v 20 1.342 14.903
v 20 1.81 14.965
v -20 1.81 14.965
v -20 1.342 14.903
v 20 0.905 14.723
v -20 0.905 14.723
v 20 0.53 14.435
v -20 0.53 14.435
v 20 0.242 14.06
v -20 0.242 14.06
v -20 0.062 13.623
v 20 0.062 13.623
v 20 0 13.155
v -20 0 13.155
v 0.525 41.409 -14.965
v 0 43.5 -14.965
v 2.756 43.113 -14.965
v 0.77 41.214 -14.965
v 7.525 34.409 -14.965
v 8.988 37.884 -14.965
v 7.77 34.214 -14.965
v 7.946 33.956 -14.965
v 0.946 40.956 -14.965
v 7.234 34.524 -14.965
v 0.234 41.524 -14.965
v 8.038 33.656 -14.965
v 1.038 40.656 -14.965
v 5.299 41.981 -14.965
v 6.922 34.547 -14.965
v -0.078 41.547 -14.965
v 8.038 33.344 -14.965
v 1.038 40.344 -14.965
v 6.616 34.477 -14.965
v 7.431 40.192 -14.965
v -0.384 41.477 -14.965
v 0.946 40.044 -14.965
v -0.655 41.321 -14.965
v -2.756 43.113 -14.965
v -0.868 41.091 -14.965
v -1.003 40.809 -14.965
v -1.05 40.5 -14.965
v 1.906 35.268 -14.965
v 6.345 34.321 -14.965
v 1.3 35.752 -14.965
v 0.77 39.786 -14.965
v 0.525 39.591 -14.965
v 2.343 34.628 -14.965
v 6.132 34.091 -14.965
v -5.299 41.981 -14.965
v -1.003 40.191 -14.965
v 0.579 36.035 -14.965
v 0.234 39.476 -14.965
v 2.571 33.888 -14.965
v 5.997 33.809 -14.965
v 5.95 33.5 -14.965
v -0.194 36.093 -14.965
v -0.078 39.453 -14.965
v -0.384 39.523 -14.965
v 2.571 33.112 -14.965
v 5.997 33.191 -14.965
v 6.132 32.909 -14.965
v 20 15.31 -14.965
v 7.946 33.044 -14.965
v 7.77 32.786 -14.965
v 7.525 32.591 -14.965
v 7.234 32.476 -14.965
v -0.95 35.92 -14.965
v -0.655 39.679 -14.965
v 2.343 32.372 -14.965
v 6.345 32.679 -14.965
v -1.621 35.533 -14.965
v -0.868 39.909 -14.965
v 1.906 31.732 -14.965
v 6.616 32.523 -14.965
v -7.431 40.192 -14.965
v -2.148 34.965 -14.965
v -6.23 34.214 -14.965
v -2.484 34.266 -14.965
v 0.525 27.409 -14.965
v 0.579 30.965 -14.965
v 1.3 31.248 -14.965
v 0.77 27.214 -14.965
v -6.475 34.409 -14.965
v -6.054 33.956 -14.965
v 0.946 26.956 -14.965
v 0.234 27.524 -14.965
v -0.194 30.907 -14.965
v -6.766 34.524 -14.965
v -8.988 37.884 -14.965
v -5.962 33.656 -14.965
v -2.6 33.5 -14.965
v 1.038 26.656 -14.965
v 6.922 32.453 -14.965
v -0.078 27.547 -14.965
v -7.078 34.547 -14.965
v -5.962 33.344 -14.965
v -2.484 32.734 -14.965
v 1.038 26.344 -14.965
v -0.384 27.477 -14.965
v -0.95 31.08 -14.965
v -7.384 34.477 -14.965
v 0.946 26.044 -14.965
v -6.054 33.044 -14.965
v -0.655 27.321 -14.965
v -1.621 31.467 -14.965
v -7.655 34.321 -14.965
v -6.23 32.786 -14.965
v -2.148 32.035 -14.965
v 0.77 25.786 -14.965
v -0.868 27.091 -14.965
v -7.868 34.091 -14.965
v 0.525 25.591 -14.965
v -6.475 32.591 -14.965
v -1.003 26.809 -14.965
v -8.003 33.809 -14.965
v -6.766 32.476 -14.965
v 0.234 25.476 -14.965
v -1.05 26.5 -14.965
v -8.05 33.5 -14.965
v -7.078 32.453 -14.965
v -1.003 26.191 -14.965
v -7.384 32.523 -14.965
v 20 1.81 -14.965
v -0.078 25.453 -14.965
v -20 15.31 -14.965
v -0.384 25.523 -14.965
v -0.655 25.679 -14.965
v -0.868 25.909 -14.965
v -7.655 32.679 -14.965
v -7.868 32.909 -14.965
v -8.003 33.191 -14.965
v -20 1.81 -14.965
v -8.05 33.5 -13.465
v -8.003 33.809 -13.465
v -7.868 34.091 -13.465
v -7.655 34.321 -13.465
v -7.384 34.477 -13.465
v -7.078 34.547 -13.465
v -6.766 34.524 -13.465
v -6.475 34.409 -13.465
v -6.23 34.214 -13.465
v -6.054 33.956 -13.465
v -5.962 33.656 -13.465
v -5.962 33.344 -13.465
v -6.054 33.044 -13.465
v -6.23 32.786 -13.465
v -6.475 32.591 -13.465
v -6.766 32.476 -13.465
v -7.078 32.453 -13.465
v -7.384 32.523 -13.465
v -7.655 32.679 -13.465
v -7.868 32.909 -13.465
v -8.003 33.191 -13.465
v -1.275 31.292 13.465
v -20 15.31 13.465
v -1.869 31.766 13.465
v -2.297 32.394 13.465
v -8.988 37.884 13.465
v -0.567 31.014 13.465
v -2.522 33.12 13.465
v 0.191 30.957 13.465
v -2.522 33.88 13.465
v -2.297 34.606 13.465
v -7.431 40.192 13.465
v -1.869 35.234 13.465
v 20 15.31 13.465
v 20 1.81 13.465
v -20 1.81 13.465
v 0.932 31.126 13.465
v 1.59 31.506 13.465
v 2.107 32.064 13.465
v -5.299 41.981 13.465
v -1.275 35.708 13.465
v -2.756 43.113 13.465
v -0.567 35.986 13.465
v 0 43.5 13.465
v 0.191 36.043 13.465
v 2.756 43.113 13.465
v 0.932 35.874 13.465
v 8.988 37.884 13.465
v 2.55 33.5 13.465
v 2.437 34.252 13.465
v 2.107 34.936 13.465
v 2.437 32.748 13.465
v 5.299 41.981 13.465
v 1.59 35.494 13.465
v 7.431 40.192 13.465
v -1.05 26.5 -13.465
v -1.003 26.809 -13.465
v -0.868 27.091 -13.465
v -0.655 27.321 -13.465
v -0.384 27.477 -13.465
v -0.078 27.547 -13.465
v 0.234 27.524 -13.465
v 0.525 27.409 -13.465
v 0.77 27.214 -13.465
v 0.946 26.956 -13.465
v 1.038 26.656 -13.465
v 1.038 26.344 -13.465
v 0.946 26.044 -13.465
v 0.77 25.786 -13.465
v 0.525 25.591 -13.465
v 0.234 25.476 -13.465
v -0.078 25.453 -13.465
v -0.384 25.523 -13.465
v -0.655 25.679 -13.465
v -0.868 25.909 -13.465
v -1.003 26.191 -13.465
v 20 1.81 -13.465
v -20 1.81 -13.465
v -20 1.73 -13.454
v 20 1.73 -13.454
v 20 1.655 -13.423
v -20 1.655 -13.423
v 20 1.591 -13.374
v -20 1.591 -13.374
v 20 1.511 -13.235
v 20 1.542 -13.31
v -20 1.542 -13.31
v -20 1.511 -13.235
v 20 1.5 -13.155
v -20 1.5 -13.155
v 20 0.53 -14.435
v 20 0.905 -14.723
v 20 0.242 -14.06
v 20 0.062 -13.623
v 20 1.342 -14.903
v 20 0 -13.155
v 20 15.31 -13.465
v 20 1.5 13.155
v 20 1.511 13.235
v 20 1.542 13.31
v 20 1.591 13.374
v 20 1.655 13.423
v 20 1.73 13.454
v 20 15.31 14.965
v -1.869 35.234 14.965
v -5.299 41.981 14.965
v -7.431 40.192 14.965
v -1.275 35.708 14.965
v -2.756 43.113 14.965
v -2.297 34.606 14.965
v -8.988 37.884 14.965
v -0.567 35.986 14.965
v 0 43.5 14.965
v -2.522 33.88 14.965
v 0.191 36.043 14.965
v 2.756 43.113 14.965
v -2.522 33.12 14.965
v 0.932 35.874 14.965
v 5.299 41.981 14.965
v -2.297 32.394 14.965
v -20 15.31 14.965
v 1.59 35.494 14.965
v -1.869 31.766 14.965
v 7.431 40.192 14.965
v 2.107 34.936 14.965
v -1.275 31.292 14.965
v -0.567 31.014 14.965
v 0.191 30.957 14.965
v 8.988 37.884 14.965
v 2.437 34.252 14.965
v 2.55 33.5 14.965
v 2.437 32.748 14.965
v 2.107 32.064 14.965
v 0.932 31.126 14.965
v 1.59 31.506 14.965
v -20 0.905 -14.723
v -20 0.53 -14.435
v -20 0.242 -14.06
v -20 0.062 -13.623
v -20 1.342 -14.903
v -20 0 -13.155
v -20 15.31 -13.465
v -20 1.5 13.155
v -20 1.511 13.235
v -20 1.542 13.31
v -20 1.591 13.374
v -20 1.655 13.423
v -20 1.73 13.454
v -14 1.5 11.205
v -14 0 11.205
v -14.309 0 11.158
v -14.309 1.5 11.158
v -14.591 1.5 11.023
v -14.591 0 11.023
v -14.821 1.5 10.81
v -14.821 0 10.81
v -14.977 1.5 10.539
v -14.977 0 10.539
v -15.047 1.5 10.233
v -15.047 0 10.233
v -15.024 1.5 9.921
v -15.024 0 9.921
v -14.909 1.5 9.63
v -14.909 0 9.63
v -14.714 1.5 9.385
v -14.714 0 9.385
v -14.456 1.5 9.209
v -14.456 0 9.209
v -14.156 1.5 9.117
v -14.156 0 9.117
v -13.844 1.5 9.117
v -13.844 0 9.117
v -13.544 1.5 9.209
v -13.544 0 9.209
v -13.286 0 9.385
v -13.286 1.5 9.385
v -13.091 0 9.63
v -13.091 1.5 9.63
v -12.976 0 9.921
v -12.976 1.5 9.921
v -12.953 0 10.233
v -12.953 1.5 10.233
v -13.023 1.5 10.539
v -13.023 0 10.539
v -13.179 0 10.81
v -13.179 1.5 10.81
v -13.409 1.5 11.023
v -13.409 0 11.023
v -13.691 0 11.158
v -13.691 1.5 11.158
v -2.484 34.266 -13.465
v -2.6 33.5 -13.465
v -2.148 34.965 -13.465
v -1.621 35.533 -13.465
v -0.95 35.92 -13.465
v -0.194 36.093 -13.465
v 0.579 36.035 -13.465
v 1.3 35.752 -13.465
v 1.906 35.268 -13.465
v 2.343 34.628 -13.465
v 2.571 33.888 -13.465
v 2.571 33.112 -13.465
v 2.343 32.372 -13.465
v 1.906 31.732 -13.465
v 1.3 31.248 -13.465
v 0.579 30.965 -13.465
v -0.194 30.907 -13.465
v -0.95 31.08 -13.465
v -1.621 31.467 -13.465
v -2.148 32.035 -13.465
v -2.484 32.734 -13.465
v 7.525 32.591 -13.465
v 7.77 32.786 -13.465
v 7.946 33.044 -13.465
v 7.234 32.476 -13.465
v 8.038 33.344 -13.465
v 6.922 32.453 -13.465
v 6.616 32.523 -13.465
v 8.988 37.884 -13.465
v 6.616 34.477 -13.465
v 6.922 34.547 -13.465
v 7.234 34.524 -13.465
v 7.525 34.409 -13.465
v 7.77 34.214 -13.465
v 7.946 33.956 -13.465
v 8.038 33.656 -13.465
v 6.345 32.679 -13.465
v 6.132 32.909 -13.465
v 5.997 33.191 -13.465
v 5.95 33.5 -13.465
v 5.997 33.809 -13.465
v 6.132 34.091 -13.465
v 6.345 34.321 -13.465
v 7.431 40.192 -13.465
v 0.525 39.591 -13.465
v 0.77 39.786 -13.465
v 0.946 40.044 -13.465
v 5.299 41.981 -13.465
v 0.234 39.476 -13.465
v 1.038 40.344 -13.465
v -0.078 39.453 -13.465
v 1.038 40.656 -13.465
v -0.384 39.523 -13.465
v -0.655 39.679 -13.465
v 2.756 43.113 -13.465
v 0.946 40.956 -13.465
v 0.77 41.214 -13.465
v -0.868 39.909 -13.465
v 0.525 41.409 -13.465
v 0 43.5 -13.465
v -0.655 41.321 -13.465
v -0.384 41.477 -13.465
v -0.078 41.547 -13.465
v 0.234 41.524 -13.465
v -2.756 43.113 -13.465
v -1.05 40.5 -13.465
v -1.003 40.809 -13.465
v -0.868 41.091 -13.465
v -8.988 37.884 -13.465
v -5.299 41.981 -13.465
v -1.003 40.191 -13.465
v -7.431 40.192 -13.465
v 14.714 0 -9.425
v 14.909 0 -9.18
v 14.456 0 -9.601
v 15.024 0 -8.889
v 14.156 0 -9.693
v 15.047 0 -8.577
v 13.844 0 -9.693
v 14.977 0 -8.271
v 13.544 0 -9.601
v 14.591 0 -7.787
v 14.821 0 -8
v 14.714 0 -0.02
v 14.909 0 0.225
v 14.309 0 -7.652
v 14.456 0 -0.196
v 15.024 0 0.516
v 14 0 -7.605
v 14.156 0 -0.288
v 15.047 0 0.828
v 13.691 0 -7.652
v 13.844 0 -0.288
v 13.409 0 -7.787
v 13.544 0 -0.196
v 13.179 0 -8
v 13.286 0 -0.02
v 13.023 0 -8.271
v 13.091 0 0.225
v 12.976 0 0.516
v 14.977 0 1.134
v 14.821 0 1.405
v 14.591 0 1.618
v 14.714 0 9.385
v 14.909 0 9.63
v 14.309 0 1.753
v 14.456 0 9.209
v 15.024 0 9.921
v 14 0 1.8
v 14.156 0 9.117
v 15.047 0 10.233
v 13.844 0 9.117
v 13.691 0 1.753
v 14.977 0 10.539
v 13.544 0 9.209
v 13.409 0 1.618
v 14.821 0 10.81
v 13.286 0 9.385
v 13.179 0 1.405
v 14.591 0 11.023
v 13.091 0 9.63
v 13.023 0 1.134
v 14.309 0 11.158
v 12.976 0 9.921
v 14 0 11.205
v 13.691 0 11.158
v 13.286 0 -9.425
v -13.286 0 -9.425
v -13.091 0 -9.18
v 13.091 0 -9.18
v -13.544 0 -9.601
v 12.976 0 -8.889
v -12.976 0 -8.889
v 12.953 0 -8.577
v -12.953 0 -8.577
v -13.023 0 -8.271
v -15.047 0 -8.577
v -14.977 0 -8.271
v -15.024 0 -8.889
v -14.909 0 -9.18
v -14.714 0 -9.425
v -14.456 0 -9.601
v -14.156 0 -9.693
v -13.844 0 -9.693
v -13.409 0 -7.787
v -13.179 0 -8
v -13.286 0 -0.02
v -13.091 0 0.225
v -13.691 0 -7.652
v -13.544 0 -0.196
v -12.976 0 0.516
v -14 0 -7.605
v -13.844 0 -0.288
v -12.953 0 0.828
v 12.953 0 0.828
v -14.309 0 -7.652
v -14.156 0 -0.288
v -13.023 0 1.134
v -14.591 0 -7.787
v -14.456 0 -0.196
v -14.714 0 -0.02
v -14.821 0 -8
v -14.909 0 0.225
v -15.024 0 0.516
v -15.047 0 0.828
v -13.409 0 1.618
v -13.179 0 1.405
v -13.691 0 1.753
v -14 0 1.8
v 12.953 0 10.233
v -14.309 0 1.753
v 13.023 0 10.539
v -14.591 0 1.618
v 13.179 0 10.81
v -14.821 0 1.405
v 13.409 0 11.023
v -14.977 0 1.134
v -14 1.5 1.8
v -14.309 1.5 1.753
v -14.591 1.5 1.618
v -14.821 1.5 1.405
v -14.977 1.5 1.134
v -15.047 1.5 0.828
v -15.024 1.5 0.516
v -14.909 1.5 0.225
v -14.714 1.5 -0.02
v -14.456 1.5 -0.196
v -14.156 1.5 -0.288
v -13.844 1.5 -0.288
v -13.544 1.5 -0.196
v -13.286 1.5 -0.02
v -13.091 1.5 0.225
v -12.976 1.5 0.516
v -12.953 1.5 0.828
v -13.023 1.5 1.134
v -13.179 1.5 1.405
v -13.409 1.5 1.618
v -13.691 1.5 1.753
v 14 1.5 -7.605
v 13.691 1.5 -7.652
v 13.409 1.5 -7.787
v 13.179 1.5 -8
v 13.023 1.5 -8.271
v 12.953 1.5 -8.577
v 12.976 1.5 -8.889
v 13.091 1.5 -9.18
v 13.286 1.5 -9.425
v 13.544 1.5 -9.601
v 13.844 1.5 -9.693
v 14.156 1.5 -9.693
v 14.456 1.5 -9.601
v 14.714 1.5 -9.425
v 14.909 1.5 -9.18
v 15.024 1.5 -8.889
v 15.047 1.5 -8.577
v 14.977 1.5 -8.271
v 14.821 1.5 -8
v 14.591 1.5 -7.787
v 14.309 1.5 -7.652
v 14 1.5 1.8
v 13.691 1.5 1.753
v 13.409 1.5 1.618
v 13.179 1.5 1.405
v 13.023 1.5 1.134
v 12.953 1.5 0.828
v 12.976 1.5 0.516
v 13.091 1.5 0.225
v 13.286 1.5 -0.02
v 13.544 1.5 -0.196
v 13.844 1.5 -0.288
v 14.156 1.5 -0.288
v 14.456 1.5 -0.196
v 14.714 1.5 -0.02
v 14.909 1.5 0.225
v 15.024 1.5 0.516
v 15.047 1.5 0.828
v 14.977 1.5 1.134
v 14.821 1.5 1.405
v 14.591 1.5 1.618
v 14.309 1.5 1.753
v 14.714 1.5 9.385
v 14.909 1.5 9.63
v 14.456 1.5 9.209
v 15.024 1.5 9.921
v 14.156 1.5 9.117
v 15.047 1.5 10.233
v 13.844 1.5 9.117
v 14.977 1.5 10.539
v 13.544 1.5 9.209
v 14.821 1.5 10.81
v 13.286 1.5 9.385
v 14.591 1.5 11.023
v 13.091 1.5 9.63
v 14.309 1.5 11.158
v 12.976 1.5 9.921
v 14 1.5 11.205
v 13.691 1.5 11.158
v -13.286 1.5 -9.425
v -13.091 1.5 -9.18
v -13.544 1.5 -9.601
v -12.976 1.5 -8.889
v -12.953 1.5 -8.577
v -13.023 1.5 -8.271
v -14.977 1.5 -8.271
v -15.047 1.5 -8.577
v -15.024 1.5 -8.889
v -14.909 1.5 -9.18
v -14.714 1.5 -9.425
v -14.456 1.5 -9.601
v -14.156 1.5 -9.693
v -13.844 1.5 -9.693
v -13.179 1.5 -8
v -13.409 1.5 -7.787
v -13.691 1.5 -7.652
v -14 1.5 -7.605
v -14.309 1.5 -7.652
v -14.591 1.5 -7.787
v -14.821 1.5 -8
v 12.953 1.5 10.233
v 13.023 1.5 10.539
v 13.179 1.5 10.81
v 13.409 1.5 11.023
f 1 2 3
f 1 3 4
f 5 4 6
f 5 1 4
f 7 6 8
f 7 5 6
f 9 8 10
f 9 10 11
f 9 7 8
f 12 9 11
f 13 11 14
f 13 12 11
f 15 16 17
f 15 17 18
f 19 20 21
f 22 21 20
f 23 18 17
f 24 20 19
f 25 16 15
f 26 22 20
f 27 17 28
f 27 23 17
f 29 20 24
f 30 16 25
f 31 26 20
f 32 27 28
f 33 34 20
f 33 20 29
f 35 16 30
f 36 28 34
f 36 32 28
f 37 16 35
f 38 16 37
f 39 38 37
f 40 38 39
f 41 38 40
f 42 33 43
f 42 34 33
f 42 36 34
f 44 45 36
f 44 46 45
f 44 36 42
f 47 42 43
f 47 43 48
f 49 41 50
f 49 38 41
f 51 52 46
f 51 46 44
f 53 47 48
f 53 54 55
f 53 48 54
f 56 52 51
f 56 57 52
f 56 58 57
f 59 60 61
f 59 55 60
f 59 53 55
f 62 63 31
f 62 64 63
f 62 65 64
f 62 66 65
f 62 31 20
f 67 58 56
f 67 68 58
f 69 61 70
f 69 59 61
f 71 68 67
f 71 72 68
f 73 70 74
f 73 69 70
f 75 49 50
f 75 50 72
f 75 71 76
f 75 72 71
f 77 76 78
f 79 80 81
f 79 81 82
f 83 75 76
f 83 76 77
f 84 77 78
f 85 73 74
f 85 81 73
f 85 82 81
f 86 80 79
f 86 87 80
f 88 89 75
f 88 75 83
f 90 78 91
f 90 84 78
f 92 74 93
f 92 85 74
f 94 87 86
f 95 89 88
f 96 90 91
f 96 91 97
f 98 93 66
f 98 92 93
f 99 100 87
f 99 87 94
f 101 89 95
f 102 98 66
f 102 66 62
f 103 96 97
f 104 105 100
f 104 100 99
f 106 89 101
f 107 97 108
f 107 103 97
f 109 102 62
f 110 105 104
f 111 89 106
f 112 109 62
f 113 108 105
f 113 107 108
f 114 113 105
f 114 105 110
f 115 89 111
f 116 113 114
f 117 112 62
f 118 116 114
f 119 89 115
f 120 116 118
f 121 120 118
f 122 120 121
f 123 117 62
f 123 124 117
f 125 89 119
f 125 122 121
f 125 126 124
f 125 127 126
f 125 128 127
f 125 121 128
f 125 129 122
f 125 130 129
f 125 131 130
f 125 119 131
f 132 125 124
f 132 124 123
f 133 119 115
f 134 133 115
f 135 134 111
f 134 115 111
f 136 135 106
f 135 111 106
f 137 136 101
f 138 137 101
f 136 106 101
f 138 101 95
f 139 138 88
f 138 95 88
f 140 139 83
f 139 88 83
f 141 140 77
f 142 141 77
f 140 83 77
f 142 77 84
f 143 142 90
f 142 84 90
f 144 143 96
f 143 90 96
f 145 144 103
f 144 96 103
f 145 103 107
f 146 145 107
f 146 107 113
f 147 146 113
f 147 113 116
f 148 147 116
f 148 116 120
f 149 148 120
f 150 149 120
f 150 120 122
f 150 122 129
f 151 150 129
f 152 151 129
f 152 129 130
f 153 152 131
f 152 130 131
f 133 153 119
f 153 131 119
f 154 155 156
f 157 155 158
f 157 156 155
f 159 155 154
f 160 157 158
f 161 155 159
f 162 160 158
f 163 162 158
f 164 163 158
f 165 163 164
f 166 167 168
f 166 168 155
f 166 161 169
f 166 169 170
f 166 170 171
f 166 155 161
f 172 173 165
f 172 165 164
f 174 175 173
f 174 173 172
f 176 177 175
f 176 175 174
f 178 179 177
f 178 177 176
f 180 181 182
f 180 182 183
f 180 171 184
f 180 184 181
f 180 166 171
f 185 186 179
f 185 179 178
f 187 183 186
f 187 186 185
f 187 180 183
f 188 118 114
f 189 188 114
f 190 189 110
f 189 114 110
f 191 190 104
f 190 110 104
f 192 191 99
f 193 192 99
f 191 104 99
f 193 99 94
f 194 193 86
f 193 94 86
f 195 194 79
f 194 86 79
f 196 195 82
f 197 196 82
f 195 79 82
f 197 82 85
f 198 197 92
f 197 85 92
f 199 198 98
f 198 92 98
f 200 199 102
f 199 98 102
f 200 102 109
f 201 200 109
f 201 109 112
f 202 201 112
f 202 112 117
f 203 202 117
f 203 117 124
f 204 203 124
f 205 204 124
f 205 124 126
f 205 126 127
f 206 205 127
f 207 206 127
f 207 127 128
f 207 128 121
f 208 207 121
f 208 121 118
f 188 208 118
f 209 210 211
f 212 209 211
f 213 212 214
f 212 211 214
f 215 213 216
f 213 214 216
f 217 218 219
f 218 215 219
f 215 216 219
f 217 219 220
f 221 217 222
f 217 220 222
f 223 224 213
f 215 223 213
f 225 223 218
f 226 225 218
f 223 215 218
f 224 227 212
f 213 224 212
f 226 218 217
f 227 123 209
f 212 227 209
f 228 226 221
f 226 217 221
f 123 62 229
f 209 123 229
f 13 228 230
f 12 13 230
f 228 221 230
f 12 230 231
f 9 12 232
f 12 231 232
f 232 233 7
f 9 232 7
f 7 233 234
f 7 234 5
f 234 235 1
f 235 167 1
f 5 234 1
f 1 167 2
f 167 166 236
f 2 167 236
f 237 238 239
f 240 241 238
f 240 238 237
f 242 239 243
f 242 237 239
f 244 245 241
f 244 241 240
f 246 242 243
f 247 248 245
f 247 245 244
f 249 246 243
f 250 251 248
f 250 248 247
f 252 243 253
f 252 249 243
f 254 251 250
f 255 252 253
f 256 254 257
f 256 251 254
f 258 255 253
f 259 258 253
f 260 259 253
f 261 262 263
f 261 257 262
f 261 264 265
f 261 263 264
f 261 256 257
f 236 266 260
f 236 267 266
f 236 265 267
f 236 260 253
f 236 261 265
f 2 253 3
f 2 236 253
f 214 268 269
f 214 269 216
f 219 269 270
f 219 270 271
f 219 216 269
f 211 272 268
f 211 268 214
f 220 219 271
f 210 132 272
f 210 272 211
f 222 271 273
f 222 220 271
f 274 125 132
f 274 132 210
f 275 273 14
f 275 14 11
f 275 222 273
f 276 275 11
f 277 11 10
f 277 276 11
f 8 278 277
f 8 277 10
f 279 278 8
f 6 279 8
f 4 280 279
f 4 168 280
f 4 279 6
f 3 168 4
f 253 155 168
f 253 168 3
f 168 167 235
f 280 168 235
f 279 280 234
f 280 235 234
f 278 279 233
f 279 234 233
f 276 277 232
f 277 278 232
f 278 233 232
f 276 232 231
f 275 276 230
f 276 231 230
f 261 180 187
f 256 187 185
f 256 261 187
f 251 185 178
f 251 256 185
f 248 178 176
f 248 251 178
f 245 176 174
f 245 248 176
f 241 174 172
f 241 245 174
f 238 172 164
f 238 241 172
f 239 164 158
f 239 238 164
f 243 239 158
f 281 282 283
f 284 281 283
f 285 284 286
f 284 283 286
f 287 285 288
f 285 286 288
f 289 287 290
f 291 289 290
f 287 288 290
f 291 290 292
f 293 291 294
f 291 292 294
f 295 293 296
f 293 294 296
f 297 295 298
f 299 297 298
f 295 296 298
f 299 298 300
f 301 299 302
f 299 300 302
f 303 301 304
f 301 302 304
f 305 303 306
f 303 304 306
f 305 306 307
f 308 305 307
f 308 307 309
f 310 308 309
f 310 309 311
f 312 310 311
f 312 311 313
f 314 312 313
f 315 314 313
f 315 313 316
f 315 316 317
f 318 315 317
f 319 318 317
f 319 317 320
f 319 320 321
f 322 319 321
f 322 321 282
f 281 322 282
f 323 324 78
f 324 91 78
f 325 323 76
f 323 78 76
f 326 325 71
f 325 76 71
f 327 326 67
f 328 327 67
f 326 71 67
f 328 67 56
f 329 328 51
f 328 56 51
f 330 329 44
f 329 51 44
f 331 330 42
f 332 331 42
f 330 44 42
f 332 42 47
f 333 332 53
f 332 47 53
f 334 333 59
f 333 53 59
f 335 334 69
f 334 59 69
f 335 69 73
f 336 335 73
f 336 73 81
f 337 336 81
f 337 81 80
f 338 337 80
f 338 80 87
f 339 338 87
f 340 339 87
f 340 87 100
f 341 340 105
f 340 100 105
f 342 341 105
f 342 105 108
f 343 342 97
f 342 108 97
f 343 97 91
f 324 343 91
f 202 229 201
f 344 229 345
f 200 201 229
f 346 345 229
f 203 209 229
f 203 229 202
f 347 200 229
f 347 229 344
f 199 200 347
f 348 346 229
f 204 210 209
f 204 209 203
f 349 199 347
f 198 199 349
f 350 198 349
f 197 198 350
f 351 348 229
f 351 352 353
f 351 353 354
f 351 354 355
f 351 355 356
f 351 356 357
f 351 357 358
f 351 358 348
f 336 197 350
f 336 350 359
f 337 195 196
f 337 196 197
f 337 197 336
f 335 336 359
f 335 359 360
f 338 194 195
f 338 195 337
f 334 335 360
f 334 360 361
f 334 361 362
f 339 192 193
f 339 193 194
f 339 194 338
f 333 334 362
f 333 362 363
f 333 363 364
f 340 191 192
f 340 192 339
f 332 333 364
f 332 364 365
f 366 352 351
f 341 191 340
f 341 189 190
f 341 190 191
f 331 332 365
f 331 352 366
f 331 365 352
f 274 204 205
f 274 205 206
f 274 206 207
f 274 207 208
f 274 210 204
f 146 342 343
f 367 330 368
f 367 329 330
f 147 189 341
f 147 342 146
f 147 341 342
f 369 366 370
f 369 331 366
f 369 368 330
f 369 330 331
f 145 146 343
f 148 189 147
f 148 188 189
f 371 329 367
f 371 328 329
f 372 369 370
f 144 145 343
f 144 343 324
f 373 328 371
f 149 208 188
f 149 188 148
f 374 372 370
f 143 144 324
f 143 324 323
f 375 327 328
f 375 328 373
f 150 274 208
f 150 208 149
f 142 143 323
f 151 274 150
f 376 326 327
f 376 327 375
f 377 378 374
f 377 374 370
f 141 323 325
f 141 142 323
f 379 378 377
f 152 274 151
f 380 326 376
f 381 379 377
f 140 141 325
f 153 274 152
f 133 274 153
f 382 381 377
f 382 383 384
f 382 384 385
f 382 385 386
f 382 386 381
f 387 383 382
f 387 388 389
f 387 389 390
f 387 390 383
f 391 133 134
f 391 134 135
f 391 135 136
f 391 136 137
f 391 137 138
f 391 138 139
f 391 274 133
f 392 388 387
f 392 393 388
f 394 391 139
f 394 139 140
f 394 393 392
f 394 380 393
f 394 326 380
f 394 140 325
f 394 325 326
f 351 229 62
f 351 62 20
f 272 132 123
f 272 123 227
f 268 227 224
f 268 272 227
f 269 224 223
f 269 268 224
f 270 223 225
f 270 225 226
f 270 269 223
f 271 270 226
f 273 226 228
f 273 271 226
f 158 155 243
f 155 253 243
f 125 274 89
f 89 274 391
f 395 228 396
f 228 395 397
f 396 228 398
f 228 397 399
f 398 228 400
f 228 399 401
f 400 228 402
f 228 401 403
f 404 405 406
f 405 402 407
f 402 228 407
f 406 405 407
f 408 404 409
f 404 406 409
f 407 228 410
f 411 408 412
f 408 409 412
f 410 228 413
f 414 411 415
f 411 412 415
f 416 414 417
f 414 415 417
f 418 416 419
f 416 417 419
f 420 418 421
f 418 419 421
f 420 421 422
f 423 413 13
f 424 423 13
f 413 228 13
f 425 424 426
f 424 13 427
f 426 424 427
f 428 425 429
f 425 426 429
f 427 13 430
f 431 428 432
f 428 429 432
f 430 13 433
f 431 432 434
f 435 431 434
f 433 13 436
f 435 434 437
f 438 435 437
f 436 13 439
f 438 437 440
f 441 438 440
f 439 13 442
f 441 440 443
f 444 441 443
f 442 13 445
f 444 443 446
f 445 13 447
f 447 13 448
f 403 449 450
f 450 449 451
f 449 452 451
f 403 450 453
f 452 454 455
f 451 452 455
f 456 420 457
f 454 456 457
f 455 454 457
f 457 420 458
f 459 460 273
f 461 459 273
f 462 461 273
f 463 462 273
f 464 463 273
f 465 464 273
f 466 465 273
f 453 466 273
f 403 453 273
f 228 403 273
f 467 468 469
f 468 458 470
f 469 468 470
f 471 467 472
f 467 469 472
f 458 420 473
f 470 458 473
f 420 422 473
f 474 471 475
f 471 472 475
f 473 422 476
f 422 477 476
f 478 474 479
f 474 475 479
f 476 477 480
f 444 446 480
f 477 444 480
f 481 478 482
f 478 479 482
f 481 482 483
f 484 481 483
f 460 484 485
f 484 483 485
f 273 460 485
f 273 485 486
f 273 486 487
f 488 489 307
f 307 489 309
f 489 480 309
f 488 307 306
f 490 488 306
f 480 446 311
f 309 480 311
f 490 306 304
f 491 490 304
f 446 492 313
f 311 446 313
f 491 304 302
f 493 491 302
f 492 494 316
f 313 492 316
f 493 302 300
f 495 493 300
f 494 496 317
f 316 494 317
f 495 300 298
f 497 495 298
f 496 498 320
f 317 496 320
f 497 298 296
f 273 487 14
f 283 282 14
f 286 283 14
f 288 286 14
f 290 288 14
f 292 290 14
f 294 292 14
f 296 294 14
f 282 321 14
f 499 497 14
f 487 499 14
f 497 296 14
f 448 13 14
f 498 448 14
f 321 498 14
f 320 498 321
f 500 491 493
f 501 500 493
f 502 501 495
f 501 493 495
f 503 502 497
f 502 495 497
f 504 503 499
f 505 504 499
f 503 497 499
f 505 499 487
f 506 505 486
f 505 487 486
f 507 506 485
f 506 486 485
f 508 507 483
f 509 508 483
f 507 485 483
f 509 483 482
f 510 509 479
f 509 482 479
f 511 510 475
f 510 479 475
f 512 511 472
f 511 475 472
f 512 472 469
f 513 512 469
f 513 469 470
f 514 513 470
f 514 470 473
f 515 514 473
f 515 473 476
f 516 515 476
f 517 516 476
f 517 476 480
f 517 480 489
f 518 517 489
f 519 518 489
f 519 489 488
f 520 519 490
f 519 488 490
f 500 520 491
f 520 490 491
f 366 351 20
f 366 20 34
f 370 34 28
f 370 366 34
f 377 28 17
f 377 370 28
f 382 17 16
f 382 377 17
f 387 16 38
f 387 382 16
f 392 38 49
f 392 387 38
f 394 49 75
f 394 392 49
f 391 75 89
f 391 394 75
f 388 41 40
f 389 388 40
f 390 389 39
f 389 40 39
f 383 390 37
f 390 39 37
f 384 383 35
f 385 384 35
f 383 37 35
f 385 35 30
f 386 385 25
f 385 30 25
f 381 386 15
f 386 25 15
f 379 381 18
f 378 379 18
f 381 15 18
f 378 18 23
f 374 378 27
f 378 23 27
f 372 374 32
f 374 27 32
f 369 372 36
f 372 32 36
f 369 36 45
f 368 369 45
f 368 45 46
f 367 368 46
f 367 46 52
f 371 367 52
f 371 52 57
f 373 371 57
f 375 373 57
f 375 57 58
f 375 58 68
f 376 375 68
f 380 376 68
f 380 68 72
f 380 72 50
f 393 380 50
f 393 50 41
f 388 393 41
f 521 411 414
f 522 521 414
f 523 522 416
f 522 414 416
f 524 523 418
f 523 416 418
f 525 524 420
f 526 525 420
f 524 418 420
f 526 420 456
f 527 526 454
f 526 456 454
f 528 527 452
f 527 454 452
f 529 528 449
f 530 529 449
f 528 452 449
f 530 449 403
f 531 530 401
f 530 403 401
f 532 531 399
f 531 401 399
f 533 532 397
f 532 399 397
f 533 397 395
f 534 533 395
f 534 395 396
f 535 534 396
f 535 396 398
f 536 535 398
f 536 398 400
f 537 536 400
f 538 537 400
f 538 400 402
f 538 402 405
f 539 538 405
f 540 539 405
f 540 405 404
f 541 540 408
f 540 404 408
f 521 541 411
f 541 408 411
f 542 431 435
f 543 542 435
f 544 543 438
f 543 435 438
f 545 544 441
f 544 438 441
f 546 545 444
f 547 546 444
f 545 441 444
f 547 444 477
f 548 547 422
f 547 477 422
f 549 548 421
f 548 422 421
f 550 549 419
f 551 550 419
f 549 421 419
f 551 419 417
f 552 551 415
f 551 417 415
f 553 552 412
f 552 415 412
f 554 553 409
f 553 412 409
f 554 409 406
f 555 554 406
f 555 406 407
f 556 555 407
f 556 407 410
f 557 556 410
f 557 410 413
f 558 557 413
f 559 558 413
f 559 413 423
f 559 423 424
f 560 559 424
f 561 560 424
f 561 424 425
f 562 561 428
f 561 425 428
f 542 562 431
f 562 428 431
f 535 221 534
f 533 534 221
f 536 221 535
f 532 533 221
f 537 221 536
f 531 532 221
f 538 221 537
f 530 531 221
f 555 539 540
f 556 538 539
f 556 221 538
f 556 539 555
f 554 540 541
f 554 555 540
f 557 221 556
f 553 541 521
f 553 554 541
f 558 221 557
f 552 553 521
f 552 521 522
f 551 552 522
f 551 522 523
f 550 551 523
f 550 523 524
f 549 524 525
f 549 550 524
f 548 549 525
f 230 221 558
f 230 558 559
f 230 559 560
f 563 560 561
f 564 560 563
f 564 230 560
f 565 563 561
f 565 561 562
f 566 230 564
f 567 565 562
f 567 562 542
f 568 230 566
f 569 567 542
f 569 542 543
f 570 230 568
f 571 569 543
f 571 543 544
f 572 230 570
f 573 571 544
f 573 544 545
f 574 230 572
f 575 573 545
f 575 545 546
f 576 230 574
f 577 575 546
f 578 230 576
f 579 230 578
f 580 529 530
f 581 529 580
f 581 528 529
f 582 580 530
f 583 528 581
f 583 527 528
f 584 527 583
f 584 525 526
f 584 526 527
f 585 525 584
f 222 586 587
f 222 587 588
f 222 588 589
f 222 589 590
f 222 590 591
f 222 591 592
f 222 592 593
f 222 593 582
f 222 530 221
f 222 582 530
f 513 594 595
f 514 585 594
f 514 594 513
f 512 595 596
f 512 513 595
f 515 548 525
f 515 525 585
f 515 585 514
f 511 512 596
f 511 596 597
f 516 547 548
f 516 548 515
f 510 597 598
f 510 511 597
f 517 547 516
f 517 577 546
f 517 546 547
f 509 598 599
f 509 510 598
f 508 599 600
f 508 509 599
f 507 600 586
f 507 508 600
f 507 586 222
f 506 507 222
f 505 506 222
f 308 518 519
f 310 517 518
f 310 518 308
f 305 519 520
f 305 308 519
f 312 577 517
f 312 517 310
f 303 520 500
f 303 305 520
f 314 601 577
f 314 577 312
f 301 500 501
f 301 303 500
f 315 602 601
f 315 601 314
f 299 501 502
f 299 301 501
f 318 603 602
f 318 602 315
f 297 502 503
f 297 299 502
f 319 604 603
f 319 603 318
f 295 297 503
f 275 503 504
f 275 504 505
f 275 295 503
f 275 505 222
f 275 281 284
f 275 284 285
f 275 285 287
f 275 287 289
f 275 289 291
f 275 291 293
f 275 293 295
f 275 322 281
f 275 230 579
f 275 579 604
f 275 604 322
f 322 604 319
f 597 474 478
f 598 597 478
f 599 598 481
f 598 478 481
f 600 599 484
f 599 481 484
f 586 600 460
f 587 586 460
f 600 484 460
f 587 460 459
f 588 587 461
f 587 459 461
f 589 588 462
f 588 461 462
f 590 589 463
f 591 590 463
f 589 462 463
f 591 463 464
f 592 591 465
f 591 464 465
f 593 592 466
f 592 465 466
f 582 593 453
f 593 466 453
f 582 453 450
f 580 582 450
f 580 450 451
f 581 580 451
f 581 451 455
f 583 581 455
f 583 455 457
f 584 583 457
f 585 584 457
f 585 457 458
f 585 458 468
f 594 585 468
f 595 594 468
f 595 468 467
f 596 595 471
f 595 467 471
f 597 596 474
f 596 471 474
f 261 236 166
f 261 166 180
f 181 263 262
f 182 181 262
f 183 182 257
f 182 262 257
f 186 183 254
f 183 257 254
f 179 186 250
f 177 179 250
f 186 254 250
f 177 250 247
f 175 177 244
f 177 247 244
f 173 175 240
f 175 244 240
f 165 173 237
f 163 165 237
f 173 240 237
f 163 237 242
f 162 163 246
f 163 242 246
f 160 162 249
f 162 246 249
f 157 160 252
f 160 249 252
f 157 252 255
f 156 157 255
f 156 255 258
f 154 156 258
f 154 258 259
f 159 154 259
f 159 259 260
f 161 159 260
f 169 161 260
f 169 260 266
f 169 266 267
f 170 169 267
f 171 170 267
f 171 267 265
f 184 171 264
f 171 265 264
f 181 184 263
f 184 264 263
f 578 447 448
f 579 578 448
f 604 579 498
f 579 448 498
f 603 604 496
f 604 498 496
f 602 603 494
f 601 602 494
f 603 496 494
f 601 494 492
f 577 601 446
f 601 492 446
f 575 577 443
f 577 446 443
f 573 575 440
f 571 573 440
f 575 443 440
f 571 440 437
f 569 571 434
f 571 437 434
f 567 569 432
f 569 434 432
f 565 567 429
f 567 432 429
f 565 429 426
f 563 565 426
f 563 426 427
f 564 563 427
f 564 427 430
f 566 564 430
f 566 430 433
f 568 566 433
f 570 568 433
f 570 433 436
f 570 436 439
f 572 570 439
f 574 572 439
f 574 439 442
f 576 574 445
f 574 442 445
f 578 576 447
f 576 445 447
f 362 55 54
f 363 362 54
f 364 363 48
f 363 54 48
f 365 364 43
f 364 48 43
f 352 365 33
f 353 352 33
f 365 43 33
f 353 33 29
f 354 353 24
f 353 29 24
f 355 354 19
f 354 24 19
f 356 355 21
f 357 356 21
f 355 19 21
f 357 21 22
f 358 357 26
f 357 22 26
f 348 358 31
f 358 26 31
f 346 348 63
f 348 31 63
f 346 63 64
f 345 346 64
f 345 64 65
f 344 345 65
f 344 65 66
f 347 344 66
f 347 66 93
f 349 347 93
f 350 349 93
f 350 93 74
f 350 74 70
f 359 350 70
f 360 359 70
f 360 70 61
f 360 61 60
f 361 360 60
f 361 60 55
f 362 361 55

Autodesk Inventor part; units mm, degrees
ref_plane "YZ Plane" through (0, 0, 0) normal (1, 0, 0) x (0, 1, 0)
ref_plane "XZ Plane" through (0, 0, 0) normal (0, 1, 0) x (-1, 0, 0)
ref_plane "XY Plane" through (0, 0, 0) normal (0, 0, 1) x (1, 0, 0)
sketch "Sketch1" plane through (0, 0, 0) normal (0, 1, 0) x (-1, 0, 0)
  line L0 (20, 14.965) -> (-20, 14.965)
  line L1 (-20, 14.965) -> (-20, -14.965)
  line L2 (-20, -14.965) -> (20, -14.965)
  line L3 (20, -14.965) -> (20, 14.965)
  point P0 (0, 0)
  dimension "d0" = 29.93
  dimension "d1" = 40
  dimension "d2" = 20
  dimension "d3" = 14.965
extrude "Plate1" add sketch "Sketch1" along normal blind 1.5
sketch "Sketch2" plane through (-20, 0, -13.465) normal (0, 0, -1) x (-1, 0, 0)
  line L0 (-40, 0) -> (0, 0)
  line L1 (0, 0) -> (0, 43.5)
  line L2 (0, 43.5) -> (-40, 43.5)
  line L3 (-40, 43.5) -> (-40, 0)
edge flange "Flange1" height 43.5 angle 90 thickness 1.5 bend radius 0.31 thickness toward (0, 0, -1) relief tear relief width 1.5 relief depth 0.75 corner gap 0.31 corner form 0 edges at (0, 1.5, -14.965) (0, 1.5, 14.965) wall of the first edge with corners at (20, 0, -13.465) (-20, 0, -13.465) (-20, 43.5, -13.465) (20, 43.5, -13.465)
bend "Bend1"
corner "Corner1"
sketch "Sketch3" plane through (-20, 43.5, 14.965) normal (0, 0, 1) x (1, 0, 0)
  line L0 (0, 0) -> (40, 0) projected
  line L1 (0, -41.69) -> (0, 0) projected
  circle A0 centre (20, -10) radius 10
  line L2 (0, -28.19) -> (40, -28.19)
  line L3 (40, -28.19) -> (40, -38.19)
  line L4 (40, -38.19) -> (0, -38.19)
  line L5 (0, -38.19) -> (0, -28.19)
  line L6 (40, -28.19) -> (28.9876, -5.6156)
  line L7 (0, -28.19) -> (11.0124, -5.6156)
  line L8 (0, 0) -> (40, 0)
  line L9 (40, 0) -> (40, -35)
  line L10 (40, -35) -> (0, -35)
  line L11 (0, -35) -> (0, 0)
  point P0 (20, -43.5)
  point P1 (20, 0)
  point P2 (0, -28.19)
  point P3 (0, -35)
  point P4 (30, -10)
  dimension "d15" = 10
  dimension "d16" = 0
  dimension "d17" = 20
  dimension "d18" = 18.19
  dimension "d19" = 0
  dimension "d20" = 40
  dimension "d21" = 10
  dimension "d22" = 35
extrude "Extrusion1" cut sketch "Sketch3" against normal blind 35 contours L0 A0 L7 L1 | L0 L9 L6 A0
sketch "Sketch4" plane through (20, 1.81, -14.965) normal (0, 0, -1) x (-1, 0, 0)
  arc A0 (28.9876, 36.0744) -> (11.0124, 36.0744) centre (20, 31.69) ccw projected
  circle A1 centre (20, 31.69) radius 2.6
  circle A2 centre (13, 31.69) radius 1.05
  circle A3 centre (27, 31.69) radius 1.05
  circle A4 centre (20, 38.69) radius 1.05
  circle A5 centre (20, 24.69) radius 1.05
  point P0 (20, -1.81)
  dimension "d25" = 5.2
  dimension "d26" = 0
  dimension "d27" = 7
  dimension "d28" = 2.1
  dimension "d29" = 7
  dimension "d30" = 0
  dimension "d31" = 2.1
  dimension "d32" = 0
  dimension "d33" = 7
  dimension "d34" = 2.1
  dimension "d35" = 7
  dimension "d36" = 0
  dimension "d37" = 2.1
extrude "Extrusion2" cut sketch "Sketch4" against normal blind 1.5
sketch "Sketch5" plane through (-20, 1.81, 14.965) normal (0, 0, 1) x (1, 0, 0)
  arc A0 (28.9876, 36.0744) -> (11.0124, 36.0744) centre (20, 31.69) ccw projected
  circle A1 centre (20, 31.69) radius 2.55
  point P0 (20, -1.81)
  dimension "d40" = 5.1
extrude "Extrusion3" cut sketch "Sketch5" against normal blind 1.5
sketch "Sketch6" plane through (0, 1.5, 0) normal (0, 1, 0) x (1, 0, 0)
  circle A0 centre (-14, -10.155) radius 1.05 projected
  circle A1 centre (-14, -0.75) radius 1.05 projected
  circle A2 centre (-14, 8.655) radius 1.05 projected
  circle A3 centre (14, -10.155) radius 1.05 projected
  circle A4 centre (14, -0.75) radius 1.05 projected
  circle A5 centre (14, 8.655) radius 1.05 projected
  point P0 (0, 0)
hole "Hole1" at (14, 1.5, -8.655) at (14, 1.5, 0.75) at (14, 1.5, 10.155) at (-14, 1.5, 10.155) at (-14, 1.5, 0.75) at (-14, 1.5, -8.655) direction (0, -1, 0) diameter 2.1 depth 1.5
equation "\"d48\" = Thickness"
equation "\"d4\" = Thickness"
equation "\"d5\" = BendReliefWidth"
equation "\"d6\" = BendReliefDepth"
equation "\"d7\" = MinimumRemnant"
equation "\"d8\" = TransitionRadius"
equation "\"d11\" = BendRadius"
equation "\"d12\" = CornerReliefSize"
equation "\"d13\" = GapSize"
equation "\"d14\" = JacobiRadiusSize"
equation "\"BendReliefWidth\" = Thickness"
equation "\"BendReliefDepth\" = 0.5 * Thickness"
equation "\"CornerReliefSize\" = 4 * Thickness"
equation "\"MinimumRemnant\" = 2 * Thickness"
equation "\"TransitionRadius\" = BendRadius"
equation "\"JacobiRadiusSize\" = BendRadius"
equation "\"GapSize\" = Thickness"
equation "\"Thickness\" = 1.5"
equation "\"BendRadius\" = 0.31"
properties part number "partpart" material "Aluminum 6061-AHC"
